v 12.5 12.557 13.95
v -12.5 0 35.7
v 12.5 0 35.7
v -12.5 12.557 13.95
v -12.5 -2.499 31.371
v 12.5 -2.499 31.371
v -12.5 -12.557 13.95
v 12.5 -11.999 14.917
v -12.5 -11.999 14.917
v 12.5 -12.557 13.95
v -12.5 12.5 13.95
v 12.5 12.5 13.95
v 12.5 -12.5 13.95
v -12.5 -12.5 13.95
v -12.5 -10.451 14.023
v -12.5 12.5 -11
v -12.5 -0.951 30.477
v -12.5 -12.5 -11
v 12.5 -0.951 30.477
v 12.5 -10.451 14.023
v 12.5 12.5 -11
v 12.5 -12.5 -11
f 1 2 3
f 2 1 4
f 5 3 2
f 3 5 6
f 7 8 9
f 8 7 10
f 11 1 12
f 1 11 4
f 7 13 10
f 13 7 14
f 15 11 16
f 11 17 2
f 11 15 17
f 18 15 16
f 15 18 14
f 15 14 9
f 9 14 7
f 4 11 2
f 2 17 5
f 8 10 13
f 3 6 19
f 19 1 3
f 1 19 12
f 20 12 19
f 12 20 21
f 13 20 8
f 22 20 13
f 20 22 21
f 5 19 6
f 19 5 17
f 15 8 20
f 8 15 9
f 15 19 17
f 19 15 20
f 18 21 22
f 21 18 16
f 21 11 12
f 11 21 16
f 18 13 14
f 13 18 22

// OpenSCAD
$fn = 20;

// Methods
module Holes (x, y) {    
    translate ([x, y, 1.5])
    cylinder (r = 4, h = 2.5);
    
    translate ([x, y, 0])
	cylinder (r = 2, h = 5 + 1);
}

difference() {
    translate([0, 0, 1.5]) 
    cube ([25, 25, 25], center = true);
}



difference() {
    translate ([0, 0, 21.2])
    rotate([0, 270, 0])
    cylinder(25, 14.5, 14.5, $fn=3, center = true);
    
    translate([0, -7, 23])
    rotate([330, 0, 0])
    cube ([27, 3, 19], center = true);
}
